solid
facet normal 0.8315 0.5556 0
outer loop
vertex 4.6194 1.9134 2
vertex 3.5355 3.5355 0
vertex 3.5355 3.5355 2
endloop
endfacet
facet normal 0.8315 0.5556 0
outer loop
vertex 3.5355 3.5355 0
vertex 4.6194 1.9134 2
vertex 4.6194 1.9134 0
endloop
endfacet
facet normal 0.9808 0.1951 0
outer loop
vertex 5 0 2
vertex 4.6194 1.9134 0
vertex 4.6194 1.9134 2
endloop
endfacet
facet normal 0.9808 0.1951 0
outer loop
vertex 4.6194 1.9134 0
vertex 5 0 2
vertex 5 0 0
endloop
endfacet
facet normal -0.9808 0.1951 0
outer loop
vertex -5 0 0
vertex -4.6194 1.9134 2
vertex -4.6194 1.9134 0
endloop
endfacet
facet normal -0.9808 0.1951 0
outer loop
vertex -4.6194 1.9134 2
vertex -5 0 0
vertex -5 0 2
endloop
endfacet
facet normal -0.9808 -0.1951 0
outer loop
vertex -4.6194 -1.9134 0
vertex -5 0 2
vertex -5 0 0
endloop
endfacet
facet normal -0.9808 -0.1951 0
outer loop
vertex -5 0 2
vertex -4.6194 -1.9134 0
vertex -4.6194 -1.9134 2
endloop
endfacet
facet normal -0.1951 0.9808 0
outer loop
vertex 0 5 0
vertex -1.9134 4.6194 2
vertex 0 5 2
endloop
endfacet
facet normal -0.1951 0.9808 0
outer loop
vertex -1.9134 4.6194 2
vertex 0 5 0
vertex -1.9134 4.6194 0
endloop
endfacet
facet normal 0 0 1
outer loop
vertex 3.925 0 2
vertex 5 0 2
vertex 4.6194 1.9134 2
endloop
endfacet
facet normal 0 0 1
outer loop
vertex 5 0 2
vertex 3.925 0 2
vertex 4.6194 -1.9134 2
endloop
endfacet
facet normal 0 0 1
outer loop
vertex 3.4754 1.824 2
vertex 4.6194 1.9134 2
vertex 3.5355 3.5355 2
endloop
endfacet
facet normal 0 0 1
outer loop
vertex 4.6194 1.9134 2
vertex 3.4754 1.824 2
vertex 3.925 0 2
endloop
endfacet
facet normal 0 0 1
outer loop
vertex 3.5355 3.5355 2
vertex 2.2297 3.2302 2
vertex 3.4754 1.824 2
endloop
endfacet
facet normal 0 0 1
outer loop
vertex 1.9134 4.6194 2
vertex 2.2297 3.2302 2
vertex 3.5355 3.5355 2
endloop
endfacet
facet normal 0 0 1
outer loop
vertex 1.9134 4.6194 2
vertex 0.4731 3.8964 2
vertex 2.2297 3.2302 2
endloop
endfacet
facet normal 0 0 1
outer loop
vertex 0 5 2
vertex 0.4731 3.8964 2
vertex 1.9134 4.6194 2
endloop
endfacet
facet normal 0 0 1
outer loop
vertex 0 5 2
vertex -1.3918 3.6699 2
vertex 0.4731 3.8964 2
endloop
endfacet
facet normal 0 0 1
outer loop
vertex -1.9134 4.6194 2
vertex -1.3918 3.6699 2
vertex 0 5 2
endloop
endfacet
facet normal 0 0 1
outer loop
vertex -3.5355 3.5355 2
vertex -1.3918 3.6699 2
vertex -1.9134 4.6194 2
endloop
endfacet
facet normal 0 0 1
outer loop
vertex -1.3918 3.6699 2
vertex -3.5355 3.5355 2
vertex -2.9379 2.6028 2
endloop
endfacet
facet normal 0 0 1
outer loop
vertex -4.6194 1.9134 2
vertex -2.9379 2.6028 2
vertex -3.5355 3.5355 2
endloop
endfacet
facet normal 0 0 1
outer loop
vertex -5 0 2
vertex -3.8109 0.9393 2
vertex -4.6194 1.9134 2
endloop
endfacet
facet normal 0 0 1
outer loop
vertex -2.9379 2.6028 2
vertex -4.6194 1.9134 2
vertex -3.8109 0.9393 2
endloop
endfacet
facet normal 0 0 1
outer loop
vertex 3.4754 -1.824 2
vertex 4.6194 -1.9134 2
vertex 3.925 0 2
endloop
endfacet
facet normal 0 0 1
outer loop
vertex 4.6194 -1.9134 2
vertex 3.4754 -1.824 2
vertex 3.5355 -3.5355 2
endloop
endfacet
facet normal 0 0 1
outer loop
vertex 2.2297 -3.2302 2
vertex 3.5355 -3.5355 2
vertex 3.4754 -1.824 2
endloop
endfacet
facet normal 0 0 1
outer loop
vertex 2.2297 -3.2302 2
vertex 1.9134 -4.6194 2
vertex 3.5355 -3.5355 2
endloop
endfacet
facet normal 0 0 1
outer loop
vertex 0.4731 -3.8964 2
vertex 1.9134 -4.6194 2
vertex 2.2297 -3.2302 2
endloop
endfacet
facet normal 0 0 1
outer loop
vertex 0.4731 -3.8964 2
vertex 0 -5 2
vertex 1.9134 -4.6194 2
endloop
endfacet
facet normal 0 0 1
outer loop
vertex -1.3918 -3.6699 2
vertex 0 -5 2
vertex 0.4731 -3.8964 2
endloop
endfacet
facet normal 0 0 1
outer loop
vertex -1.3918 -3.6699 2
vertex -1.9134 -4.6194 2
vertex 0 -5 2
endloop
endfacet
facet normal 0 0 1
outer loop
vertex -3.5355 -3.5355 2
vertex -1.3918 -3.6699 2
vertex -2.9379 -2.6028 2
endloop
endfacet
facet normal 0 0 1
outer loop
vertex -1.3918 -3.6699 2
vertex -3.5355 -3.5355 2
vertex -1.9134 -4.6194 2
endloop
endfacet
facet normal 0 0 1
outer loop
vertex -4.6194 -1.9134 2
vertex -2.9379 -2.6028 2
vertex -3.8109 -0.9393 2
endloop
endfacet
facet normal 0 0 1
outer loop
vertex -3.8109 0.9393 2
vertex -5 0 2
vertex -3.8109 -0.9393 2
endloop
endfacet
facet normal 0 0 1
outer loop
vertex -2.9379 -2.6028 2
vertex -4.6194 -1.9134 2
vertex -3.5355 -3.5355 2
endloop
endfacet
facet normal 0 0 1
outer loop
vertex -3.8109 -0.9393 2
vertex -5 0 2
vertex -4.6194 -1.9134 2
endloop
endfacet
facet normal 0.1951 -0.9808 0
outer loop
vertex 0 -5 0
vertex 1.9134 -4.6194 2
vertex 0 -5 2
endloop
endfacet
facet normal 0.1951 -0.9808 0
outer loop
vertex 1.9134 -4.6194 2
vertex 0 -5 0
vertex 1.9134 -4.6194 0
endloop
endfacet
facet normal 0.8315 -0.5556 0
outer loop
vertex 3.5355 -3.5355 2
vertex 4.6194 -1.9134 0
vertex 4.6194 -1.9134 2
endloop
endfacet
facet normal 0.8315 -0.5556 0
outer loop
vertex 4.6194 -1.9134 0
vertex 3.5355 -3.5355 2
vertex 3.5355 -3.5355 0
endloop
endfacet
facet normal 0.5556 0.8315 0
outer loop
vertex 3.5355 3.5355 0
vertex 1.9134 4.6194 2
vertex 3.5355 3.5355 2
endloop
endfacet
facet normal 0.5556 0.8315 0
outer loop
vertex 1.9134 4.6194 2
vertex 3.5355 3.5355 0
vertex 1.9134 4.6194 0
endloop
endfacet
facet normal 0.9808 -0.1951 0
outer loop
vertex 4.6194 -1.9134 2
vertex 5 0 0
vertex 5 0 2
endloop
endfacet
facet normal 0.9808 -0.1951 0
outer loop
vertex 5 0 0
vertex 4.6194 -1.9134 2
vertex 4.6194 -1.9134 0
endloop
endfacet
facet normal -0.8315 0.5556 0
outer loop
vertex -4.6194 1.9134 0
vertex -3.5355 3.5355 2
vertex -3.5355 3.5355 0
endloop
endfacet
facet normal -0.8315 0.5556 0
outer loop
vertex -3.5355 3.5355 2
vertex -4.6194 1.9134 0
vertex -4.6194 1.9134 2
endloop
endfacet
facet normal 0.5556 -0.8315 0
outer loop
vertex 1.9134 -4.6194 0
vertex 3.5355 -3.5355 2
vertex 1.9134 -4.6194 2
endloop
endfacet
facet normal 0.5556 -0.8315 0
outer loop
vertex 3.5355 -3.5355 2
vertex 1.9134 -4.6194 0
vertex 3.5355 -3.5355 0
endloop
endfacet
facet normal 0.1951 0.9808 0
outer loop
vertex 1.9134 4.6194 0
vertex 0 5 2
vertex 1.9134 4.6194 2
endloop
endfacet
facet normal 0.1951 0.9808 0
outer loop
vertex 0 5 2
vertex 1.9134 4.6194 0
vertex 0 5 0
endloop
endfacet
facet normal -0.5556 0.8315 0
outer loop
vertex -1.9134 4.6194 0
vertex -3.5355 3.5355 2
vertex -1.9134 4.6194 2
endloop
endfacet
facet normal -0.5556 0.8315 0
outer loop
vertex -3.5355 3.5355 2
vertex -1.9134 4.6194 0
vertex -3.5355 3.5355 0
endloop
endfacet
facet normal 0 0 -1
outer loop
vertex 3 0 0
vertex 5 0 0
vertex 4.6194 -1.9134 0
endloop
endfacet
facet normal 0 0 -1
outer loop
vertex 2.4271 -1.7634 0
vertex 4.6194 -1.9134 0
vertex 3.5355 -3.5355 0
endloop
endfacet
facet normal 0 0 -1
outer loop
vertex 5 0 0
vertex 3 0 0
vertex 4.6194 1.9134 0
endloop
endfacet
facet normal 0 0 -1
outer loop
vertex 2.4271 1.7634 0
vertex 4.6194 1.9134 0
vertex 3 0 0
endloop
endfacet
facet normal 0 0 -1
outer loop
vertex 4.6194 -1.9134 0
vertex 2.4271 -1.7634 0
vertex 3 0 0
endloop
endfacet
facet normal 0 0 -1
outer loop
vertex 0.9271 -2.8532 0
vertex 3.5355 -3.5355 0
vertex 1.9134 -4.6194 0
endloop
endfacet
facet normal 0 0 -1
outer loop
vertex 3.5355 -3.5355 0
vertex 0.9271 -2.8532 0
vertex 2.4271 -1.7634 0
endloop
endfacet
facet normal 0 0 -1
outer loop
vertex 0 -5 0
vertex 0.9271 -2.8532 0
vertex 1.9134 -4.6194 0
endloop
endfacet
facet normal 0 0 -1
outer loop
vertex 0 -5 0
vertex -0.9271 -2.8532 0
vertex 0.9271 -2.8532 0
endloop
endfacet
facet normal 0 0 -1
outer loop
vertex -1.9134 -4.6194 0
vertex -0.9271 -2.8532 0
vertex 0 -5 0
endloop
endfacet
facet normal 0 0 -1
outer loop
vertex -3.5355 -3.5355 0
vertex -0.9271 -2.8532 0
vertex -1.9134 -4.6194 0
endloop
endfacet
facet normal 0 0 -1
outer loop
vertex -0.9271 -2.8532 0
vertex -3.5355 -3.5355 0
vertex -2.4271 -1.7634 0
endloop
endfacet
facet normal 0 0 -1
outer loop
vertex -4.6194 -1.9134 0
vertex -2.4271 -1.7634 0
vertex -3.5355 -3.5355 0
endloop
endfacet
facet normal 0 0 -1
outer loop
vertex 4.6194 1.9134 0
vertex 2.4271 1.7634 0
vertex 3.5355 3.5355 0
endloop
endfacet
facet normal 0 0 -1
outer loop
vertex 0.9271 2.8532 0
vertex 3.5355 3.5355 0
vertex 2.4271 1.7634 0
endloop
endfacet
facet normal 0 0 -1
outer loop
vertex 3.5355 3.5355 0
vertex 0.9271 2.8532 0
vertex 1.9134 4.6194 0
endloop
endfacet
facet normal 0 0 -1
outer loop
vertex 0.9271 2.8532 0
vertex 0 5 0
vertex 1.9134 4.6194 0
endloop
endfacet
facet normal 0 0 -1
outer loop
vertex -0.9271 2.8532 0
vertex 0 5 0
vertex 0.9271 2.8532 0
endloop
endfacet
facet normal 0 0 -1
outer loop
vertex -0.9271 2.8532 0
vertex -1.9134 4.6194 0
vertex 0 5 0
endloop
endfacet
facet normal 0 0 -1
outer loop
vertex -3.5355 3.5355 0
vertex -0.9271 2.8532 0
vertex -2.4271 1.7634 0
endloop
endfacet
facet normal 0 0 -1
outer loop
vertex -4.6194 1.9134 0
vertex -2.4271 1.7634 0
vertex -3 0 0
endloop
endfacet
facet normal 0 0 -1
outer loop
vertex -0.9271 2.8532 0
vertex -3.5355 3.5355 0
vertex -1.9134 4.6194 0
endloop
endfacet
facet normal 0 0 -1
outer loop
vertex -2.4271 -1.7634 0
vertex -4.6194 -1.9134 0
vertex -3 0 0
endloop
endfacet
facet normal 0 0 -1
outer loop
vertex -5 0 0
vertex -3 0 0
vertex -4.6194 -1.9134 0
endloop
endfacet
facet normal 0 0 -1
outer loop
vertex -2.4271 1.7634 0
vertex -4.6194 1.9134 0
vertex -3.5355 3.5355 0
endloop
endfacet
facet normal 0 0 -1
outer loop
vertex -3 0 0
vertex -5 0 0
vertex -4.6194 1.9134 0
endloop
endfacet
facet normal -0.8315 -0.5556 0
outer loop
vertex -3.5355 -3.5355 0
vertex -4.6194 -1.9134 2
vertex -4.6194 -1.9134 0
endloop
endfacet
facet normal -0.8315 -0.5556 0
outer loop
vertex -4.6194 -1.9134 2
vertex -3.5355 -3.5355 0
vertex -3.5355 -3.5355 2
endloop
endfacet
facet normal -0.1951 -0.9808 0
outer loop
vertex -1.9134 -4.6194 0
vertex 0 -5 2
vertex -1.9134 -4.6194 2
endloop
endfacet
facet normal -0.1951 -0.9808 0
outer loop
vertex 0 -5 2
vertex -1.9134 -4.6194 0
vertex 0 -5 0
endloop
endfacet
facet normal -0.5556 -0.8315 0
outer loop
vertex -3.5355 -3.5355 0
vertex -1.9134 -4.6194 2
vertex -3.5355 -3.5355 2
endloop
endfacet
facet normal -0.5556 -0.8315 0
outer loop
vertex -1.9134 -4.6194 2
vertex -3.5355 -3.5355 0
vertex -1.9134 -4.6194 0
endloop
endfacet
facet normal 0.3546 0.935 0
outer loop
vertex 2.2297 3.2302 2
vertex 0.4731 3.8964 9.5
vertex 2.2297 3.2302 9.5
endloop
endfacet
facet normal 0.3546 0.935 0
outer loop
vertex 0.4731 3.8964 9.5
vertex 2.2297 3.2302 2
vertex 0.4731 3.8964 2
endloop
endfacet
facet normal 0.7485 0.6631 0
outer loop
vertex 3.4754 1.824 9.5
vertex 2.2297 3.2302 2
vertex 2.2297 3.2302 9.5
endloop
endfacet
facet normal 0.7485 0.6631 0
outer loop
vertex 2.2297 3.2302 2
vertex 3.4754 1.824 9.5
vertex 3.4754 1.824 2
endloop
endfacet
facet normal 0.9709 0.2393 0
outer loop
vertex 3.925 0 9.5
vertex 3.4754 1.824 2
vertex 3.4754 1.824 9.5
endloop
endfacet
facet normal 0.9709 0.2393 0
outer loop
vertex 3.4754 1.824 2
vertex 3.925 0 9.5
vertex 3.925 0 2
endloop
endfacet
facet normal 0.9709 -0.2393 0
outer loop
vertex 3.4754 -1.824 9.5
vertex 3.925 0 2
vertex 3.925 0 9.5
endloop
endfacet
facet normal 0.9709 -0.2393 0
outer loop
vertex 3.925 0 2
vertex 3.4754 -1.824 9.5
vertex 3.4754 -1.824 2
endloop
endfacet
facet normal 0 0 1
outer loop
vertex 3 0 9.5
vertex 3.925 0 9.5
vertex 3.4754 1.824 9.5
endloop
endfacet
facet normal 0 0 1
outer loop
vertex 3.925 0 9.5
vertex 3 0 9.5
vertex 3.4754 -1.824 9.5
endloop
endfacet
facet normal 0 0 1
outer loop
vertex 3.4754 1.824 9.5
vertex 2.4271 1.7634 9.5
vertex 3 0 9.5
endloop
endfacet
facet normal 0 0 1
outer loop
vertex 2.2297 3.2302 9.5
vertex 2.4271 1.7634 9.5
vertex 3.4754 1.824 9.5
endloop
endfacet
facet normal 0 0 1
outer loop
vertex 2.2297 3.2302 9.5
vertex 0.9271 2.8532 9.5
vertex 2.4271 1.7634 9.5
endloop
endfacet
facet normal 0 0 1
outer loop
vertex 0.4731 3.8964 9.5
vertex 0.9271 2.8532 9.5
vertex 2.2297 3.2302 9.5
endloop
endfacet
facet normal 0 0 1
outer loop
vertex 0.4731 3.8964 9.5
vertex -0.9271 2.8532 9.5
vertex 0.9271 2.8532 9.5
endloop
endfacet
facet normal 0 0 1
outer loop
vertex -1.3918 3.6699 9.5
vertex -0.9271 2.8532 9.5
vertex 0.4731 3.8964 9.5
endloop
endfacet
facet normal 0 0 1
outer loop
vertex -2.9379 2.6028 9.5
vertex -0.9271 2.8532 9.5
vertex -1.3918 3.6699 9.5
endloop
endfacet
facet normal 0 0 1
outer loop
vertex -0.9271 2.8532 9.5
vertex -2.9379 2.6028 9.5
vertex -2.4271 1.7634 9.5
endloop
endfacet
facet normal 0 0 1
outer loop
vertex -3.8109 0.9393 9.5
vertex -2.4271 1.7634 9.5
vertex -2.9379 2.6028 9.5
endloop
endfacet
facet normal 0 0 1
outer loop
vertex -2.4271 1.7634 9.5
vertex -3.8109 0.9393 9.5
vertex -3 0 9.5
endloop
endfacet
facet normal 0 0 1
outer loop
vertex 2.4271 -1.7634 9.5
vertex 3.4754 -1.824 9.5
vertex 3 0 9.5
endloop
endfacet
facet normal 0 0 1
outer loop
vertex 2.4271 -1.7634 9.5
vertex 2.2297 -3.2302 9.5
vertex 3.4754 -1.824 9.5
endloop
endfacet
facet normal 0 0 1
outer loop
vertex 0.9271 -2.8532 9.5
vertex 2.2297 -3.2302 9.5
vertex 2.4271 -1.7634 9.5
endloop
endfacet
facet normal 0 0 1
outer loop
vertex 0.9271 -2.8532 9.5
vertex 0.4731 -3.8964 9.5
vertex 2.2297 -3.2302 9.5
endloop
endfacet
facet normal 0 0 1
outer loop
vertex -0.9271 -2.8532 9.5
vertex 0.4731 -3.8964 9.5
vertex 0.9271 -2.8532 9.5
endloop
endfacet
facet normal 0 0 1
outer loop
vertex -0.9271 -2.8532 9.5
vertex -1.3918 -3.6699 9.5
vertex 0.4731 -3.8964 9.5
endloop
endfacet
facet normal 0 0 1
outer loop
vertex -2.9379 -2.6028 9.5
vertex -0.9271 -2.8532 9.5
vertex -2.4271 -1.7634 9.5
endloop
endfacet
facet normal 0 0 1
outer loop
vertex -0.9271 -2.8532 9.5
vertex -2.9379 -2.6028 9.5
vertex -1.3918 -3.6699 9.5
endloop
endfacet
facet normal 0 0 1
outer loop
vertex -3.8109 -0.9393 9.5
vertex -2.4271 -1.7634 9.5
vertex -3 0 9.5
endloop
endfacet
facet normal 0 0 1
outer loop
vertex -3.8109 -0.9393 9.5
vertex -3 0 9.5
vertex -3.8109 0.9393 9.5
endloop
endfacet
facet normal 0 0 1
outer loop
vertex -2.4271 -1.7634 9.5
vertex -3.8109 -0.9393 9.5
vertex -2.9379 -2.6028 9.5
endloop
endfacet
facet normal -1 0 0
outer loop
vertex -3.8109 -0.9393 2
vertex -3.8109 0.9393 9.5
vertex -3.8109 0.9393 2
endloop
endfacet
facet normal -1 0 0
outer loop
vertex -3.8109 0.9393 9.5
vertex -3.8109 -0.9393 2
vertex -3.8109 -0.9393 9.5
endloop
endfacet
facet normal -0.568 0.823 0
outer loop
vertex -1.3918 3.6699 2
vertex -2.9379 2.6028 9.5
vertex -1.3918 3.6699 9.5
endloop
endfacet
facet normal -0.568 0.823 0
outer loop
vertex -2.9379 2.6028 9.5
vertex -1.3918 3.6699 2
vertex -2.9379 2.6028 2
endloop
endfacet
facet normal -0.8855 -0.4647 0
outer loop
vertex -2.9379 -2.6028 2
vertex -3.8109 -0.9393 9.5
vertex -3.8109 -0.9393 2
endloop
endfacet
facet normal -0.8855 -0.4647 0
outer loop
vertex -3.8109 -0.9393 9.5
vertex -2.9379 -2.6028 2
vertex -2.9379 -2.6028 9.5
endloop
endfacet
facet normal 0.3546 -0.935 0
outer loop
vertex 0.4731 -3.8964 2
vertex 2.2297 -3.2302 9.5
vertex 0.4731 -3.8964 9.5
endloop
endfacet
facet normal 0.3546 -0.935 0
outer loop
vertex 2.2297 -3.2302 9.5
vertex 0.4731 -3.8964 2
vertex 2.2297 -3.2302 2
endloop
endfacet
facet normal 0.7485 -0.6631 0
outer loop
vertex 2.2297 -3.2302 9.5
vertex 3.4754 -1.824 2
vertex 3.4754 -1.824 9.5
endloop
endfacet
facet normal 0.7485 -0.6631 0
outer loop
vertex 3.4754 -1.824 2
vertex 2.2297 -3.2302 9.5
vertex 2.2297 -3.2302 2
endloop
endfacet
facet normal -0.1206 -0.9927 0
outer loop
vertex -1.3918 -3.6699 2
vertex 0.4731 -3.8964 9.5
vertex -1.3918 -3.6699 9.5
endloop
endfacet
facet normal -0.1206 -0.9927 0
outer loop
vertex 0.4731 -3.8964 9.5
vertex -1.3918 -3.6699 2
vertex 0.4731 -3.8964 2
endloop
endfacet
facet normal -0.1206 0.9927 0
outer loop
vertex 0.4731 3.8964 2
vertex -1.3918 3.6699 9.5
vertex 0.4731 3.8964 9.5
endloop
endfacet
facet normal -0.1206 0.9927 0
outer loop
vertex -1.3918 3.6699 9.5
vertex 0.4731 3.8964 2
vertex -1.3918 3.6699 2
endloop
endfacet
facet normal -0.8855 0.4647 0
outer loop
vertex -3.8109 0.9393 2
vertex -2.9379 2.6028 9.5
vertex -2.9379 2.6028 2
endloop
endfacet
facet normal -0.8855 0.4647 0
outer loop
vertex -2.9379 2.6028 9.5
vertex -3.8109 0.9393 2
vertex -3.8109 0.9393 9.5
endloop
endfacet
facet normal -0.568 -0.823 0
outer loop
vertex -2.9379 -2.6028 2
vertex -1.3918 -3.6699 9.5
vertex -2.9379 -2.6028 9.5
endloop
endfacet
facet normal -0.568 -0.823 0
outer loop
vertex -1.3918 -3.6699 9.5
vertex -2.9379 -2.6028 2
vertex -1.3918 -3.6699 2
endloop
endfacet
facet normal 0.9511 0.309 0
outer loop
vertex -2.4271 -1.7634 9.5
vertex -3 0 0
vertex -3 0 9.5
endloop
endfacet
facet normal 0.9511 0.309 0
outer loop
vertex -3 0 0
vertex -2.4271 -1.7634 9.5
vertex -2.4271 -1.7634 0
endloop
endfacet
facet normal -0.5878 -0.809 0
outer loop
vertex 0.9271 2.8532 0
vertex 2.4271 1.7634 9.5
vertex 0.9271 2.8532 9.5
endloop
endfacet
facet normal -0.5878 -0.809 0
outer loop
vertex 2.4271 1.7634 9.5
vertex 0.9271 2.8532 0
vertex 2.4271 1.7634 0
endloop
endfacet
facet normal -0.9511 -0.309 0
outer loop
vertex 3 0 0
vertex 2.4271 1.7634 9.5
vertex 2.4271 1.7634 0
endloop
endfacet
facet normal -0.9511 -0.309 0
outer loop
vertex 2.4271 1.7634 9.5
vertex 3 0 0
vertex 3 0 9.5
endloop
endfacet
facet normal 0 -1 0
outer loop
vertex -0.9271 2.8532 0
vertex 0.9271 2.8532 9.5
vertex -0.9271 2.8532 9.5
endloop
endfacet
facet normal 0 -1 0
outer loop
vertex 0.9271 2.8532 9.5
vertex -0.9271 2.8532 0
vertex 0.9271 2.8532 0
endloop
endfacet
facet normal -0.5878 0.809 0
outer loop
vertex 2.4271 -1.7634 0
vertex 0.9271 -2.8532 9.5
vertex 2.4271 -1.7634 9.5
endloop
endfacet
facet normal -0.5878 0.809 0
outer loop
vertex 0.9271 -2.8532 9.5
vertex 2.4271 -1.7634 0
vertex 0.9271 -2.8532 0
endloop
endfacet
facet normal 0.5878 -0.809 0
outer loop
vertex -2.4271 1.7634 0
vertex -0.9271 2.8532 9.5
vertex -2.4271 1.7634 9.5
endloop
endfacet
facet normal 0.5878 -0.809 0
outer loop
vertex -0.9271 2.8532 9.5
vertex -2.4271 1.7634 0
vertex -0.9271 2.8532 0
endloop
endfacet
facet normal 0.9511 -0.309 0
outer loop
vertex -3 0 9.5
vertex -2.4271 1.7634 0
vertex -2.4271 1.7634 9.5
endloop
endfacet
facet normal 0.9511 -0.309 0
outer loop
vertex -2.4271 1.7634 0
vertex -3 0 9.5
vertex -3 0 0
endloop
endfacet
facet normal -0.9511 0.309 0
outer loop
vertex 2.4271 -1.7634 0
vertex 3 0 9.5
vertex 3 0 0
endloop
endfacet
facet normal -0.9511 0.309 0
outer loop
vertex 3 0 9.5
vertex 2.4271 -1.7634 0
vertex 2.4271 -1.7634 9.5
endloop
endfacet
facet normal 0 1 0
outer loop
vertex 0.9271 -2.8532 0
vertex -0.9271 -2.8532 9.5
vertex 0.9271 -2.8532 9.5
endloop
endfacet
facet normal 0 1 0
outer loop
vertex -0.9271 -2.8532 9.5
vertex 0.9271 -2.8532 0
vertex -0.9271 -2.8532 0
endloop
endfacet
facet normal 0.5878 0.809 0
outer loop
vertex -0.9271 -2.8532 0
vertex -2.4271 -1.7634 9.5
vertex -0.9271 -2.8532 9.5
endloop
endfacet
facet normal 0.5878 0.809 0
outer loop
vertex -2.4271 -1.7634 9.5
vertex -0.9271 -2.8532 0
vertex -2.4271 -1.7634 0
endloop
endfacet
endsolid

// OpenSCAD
//Make this slightly larger than actual pen size for a good tolerance
pencil_hole_diameter = 6; 

//make this one slightly smaller than the hole for press fit
adapter_size_diameter = 7.85; 

//Defines how long into the mount the plug goes, about 5-10mm is good for stability
Insert_length = 7.5;

// Use same diameter as in the mount
collar_diameter = 10; 

// Any height will do, about 2mm is good
collar_height = 2;



difference() {
	union() {
		cylinder(h = collar_height, r1 = collar_diameter/2, r2 = collar_diameter/2, center = false);
		translate([0, 0, collar_height]) cylinder(h = Insert_length, r1 = adapter_size_diameter/2, r2 = adapter_size_diameter/2, center = false);
	}
	translate([0, 0, -1]) cylinder(h = (Insert_length+collar_height)+2, r1 = pencil_hole_diameter/2, r2 = pencil_hole_diameter/2, center = false);
}
